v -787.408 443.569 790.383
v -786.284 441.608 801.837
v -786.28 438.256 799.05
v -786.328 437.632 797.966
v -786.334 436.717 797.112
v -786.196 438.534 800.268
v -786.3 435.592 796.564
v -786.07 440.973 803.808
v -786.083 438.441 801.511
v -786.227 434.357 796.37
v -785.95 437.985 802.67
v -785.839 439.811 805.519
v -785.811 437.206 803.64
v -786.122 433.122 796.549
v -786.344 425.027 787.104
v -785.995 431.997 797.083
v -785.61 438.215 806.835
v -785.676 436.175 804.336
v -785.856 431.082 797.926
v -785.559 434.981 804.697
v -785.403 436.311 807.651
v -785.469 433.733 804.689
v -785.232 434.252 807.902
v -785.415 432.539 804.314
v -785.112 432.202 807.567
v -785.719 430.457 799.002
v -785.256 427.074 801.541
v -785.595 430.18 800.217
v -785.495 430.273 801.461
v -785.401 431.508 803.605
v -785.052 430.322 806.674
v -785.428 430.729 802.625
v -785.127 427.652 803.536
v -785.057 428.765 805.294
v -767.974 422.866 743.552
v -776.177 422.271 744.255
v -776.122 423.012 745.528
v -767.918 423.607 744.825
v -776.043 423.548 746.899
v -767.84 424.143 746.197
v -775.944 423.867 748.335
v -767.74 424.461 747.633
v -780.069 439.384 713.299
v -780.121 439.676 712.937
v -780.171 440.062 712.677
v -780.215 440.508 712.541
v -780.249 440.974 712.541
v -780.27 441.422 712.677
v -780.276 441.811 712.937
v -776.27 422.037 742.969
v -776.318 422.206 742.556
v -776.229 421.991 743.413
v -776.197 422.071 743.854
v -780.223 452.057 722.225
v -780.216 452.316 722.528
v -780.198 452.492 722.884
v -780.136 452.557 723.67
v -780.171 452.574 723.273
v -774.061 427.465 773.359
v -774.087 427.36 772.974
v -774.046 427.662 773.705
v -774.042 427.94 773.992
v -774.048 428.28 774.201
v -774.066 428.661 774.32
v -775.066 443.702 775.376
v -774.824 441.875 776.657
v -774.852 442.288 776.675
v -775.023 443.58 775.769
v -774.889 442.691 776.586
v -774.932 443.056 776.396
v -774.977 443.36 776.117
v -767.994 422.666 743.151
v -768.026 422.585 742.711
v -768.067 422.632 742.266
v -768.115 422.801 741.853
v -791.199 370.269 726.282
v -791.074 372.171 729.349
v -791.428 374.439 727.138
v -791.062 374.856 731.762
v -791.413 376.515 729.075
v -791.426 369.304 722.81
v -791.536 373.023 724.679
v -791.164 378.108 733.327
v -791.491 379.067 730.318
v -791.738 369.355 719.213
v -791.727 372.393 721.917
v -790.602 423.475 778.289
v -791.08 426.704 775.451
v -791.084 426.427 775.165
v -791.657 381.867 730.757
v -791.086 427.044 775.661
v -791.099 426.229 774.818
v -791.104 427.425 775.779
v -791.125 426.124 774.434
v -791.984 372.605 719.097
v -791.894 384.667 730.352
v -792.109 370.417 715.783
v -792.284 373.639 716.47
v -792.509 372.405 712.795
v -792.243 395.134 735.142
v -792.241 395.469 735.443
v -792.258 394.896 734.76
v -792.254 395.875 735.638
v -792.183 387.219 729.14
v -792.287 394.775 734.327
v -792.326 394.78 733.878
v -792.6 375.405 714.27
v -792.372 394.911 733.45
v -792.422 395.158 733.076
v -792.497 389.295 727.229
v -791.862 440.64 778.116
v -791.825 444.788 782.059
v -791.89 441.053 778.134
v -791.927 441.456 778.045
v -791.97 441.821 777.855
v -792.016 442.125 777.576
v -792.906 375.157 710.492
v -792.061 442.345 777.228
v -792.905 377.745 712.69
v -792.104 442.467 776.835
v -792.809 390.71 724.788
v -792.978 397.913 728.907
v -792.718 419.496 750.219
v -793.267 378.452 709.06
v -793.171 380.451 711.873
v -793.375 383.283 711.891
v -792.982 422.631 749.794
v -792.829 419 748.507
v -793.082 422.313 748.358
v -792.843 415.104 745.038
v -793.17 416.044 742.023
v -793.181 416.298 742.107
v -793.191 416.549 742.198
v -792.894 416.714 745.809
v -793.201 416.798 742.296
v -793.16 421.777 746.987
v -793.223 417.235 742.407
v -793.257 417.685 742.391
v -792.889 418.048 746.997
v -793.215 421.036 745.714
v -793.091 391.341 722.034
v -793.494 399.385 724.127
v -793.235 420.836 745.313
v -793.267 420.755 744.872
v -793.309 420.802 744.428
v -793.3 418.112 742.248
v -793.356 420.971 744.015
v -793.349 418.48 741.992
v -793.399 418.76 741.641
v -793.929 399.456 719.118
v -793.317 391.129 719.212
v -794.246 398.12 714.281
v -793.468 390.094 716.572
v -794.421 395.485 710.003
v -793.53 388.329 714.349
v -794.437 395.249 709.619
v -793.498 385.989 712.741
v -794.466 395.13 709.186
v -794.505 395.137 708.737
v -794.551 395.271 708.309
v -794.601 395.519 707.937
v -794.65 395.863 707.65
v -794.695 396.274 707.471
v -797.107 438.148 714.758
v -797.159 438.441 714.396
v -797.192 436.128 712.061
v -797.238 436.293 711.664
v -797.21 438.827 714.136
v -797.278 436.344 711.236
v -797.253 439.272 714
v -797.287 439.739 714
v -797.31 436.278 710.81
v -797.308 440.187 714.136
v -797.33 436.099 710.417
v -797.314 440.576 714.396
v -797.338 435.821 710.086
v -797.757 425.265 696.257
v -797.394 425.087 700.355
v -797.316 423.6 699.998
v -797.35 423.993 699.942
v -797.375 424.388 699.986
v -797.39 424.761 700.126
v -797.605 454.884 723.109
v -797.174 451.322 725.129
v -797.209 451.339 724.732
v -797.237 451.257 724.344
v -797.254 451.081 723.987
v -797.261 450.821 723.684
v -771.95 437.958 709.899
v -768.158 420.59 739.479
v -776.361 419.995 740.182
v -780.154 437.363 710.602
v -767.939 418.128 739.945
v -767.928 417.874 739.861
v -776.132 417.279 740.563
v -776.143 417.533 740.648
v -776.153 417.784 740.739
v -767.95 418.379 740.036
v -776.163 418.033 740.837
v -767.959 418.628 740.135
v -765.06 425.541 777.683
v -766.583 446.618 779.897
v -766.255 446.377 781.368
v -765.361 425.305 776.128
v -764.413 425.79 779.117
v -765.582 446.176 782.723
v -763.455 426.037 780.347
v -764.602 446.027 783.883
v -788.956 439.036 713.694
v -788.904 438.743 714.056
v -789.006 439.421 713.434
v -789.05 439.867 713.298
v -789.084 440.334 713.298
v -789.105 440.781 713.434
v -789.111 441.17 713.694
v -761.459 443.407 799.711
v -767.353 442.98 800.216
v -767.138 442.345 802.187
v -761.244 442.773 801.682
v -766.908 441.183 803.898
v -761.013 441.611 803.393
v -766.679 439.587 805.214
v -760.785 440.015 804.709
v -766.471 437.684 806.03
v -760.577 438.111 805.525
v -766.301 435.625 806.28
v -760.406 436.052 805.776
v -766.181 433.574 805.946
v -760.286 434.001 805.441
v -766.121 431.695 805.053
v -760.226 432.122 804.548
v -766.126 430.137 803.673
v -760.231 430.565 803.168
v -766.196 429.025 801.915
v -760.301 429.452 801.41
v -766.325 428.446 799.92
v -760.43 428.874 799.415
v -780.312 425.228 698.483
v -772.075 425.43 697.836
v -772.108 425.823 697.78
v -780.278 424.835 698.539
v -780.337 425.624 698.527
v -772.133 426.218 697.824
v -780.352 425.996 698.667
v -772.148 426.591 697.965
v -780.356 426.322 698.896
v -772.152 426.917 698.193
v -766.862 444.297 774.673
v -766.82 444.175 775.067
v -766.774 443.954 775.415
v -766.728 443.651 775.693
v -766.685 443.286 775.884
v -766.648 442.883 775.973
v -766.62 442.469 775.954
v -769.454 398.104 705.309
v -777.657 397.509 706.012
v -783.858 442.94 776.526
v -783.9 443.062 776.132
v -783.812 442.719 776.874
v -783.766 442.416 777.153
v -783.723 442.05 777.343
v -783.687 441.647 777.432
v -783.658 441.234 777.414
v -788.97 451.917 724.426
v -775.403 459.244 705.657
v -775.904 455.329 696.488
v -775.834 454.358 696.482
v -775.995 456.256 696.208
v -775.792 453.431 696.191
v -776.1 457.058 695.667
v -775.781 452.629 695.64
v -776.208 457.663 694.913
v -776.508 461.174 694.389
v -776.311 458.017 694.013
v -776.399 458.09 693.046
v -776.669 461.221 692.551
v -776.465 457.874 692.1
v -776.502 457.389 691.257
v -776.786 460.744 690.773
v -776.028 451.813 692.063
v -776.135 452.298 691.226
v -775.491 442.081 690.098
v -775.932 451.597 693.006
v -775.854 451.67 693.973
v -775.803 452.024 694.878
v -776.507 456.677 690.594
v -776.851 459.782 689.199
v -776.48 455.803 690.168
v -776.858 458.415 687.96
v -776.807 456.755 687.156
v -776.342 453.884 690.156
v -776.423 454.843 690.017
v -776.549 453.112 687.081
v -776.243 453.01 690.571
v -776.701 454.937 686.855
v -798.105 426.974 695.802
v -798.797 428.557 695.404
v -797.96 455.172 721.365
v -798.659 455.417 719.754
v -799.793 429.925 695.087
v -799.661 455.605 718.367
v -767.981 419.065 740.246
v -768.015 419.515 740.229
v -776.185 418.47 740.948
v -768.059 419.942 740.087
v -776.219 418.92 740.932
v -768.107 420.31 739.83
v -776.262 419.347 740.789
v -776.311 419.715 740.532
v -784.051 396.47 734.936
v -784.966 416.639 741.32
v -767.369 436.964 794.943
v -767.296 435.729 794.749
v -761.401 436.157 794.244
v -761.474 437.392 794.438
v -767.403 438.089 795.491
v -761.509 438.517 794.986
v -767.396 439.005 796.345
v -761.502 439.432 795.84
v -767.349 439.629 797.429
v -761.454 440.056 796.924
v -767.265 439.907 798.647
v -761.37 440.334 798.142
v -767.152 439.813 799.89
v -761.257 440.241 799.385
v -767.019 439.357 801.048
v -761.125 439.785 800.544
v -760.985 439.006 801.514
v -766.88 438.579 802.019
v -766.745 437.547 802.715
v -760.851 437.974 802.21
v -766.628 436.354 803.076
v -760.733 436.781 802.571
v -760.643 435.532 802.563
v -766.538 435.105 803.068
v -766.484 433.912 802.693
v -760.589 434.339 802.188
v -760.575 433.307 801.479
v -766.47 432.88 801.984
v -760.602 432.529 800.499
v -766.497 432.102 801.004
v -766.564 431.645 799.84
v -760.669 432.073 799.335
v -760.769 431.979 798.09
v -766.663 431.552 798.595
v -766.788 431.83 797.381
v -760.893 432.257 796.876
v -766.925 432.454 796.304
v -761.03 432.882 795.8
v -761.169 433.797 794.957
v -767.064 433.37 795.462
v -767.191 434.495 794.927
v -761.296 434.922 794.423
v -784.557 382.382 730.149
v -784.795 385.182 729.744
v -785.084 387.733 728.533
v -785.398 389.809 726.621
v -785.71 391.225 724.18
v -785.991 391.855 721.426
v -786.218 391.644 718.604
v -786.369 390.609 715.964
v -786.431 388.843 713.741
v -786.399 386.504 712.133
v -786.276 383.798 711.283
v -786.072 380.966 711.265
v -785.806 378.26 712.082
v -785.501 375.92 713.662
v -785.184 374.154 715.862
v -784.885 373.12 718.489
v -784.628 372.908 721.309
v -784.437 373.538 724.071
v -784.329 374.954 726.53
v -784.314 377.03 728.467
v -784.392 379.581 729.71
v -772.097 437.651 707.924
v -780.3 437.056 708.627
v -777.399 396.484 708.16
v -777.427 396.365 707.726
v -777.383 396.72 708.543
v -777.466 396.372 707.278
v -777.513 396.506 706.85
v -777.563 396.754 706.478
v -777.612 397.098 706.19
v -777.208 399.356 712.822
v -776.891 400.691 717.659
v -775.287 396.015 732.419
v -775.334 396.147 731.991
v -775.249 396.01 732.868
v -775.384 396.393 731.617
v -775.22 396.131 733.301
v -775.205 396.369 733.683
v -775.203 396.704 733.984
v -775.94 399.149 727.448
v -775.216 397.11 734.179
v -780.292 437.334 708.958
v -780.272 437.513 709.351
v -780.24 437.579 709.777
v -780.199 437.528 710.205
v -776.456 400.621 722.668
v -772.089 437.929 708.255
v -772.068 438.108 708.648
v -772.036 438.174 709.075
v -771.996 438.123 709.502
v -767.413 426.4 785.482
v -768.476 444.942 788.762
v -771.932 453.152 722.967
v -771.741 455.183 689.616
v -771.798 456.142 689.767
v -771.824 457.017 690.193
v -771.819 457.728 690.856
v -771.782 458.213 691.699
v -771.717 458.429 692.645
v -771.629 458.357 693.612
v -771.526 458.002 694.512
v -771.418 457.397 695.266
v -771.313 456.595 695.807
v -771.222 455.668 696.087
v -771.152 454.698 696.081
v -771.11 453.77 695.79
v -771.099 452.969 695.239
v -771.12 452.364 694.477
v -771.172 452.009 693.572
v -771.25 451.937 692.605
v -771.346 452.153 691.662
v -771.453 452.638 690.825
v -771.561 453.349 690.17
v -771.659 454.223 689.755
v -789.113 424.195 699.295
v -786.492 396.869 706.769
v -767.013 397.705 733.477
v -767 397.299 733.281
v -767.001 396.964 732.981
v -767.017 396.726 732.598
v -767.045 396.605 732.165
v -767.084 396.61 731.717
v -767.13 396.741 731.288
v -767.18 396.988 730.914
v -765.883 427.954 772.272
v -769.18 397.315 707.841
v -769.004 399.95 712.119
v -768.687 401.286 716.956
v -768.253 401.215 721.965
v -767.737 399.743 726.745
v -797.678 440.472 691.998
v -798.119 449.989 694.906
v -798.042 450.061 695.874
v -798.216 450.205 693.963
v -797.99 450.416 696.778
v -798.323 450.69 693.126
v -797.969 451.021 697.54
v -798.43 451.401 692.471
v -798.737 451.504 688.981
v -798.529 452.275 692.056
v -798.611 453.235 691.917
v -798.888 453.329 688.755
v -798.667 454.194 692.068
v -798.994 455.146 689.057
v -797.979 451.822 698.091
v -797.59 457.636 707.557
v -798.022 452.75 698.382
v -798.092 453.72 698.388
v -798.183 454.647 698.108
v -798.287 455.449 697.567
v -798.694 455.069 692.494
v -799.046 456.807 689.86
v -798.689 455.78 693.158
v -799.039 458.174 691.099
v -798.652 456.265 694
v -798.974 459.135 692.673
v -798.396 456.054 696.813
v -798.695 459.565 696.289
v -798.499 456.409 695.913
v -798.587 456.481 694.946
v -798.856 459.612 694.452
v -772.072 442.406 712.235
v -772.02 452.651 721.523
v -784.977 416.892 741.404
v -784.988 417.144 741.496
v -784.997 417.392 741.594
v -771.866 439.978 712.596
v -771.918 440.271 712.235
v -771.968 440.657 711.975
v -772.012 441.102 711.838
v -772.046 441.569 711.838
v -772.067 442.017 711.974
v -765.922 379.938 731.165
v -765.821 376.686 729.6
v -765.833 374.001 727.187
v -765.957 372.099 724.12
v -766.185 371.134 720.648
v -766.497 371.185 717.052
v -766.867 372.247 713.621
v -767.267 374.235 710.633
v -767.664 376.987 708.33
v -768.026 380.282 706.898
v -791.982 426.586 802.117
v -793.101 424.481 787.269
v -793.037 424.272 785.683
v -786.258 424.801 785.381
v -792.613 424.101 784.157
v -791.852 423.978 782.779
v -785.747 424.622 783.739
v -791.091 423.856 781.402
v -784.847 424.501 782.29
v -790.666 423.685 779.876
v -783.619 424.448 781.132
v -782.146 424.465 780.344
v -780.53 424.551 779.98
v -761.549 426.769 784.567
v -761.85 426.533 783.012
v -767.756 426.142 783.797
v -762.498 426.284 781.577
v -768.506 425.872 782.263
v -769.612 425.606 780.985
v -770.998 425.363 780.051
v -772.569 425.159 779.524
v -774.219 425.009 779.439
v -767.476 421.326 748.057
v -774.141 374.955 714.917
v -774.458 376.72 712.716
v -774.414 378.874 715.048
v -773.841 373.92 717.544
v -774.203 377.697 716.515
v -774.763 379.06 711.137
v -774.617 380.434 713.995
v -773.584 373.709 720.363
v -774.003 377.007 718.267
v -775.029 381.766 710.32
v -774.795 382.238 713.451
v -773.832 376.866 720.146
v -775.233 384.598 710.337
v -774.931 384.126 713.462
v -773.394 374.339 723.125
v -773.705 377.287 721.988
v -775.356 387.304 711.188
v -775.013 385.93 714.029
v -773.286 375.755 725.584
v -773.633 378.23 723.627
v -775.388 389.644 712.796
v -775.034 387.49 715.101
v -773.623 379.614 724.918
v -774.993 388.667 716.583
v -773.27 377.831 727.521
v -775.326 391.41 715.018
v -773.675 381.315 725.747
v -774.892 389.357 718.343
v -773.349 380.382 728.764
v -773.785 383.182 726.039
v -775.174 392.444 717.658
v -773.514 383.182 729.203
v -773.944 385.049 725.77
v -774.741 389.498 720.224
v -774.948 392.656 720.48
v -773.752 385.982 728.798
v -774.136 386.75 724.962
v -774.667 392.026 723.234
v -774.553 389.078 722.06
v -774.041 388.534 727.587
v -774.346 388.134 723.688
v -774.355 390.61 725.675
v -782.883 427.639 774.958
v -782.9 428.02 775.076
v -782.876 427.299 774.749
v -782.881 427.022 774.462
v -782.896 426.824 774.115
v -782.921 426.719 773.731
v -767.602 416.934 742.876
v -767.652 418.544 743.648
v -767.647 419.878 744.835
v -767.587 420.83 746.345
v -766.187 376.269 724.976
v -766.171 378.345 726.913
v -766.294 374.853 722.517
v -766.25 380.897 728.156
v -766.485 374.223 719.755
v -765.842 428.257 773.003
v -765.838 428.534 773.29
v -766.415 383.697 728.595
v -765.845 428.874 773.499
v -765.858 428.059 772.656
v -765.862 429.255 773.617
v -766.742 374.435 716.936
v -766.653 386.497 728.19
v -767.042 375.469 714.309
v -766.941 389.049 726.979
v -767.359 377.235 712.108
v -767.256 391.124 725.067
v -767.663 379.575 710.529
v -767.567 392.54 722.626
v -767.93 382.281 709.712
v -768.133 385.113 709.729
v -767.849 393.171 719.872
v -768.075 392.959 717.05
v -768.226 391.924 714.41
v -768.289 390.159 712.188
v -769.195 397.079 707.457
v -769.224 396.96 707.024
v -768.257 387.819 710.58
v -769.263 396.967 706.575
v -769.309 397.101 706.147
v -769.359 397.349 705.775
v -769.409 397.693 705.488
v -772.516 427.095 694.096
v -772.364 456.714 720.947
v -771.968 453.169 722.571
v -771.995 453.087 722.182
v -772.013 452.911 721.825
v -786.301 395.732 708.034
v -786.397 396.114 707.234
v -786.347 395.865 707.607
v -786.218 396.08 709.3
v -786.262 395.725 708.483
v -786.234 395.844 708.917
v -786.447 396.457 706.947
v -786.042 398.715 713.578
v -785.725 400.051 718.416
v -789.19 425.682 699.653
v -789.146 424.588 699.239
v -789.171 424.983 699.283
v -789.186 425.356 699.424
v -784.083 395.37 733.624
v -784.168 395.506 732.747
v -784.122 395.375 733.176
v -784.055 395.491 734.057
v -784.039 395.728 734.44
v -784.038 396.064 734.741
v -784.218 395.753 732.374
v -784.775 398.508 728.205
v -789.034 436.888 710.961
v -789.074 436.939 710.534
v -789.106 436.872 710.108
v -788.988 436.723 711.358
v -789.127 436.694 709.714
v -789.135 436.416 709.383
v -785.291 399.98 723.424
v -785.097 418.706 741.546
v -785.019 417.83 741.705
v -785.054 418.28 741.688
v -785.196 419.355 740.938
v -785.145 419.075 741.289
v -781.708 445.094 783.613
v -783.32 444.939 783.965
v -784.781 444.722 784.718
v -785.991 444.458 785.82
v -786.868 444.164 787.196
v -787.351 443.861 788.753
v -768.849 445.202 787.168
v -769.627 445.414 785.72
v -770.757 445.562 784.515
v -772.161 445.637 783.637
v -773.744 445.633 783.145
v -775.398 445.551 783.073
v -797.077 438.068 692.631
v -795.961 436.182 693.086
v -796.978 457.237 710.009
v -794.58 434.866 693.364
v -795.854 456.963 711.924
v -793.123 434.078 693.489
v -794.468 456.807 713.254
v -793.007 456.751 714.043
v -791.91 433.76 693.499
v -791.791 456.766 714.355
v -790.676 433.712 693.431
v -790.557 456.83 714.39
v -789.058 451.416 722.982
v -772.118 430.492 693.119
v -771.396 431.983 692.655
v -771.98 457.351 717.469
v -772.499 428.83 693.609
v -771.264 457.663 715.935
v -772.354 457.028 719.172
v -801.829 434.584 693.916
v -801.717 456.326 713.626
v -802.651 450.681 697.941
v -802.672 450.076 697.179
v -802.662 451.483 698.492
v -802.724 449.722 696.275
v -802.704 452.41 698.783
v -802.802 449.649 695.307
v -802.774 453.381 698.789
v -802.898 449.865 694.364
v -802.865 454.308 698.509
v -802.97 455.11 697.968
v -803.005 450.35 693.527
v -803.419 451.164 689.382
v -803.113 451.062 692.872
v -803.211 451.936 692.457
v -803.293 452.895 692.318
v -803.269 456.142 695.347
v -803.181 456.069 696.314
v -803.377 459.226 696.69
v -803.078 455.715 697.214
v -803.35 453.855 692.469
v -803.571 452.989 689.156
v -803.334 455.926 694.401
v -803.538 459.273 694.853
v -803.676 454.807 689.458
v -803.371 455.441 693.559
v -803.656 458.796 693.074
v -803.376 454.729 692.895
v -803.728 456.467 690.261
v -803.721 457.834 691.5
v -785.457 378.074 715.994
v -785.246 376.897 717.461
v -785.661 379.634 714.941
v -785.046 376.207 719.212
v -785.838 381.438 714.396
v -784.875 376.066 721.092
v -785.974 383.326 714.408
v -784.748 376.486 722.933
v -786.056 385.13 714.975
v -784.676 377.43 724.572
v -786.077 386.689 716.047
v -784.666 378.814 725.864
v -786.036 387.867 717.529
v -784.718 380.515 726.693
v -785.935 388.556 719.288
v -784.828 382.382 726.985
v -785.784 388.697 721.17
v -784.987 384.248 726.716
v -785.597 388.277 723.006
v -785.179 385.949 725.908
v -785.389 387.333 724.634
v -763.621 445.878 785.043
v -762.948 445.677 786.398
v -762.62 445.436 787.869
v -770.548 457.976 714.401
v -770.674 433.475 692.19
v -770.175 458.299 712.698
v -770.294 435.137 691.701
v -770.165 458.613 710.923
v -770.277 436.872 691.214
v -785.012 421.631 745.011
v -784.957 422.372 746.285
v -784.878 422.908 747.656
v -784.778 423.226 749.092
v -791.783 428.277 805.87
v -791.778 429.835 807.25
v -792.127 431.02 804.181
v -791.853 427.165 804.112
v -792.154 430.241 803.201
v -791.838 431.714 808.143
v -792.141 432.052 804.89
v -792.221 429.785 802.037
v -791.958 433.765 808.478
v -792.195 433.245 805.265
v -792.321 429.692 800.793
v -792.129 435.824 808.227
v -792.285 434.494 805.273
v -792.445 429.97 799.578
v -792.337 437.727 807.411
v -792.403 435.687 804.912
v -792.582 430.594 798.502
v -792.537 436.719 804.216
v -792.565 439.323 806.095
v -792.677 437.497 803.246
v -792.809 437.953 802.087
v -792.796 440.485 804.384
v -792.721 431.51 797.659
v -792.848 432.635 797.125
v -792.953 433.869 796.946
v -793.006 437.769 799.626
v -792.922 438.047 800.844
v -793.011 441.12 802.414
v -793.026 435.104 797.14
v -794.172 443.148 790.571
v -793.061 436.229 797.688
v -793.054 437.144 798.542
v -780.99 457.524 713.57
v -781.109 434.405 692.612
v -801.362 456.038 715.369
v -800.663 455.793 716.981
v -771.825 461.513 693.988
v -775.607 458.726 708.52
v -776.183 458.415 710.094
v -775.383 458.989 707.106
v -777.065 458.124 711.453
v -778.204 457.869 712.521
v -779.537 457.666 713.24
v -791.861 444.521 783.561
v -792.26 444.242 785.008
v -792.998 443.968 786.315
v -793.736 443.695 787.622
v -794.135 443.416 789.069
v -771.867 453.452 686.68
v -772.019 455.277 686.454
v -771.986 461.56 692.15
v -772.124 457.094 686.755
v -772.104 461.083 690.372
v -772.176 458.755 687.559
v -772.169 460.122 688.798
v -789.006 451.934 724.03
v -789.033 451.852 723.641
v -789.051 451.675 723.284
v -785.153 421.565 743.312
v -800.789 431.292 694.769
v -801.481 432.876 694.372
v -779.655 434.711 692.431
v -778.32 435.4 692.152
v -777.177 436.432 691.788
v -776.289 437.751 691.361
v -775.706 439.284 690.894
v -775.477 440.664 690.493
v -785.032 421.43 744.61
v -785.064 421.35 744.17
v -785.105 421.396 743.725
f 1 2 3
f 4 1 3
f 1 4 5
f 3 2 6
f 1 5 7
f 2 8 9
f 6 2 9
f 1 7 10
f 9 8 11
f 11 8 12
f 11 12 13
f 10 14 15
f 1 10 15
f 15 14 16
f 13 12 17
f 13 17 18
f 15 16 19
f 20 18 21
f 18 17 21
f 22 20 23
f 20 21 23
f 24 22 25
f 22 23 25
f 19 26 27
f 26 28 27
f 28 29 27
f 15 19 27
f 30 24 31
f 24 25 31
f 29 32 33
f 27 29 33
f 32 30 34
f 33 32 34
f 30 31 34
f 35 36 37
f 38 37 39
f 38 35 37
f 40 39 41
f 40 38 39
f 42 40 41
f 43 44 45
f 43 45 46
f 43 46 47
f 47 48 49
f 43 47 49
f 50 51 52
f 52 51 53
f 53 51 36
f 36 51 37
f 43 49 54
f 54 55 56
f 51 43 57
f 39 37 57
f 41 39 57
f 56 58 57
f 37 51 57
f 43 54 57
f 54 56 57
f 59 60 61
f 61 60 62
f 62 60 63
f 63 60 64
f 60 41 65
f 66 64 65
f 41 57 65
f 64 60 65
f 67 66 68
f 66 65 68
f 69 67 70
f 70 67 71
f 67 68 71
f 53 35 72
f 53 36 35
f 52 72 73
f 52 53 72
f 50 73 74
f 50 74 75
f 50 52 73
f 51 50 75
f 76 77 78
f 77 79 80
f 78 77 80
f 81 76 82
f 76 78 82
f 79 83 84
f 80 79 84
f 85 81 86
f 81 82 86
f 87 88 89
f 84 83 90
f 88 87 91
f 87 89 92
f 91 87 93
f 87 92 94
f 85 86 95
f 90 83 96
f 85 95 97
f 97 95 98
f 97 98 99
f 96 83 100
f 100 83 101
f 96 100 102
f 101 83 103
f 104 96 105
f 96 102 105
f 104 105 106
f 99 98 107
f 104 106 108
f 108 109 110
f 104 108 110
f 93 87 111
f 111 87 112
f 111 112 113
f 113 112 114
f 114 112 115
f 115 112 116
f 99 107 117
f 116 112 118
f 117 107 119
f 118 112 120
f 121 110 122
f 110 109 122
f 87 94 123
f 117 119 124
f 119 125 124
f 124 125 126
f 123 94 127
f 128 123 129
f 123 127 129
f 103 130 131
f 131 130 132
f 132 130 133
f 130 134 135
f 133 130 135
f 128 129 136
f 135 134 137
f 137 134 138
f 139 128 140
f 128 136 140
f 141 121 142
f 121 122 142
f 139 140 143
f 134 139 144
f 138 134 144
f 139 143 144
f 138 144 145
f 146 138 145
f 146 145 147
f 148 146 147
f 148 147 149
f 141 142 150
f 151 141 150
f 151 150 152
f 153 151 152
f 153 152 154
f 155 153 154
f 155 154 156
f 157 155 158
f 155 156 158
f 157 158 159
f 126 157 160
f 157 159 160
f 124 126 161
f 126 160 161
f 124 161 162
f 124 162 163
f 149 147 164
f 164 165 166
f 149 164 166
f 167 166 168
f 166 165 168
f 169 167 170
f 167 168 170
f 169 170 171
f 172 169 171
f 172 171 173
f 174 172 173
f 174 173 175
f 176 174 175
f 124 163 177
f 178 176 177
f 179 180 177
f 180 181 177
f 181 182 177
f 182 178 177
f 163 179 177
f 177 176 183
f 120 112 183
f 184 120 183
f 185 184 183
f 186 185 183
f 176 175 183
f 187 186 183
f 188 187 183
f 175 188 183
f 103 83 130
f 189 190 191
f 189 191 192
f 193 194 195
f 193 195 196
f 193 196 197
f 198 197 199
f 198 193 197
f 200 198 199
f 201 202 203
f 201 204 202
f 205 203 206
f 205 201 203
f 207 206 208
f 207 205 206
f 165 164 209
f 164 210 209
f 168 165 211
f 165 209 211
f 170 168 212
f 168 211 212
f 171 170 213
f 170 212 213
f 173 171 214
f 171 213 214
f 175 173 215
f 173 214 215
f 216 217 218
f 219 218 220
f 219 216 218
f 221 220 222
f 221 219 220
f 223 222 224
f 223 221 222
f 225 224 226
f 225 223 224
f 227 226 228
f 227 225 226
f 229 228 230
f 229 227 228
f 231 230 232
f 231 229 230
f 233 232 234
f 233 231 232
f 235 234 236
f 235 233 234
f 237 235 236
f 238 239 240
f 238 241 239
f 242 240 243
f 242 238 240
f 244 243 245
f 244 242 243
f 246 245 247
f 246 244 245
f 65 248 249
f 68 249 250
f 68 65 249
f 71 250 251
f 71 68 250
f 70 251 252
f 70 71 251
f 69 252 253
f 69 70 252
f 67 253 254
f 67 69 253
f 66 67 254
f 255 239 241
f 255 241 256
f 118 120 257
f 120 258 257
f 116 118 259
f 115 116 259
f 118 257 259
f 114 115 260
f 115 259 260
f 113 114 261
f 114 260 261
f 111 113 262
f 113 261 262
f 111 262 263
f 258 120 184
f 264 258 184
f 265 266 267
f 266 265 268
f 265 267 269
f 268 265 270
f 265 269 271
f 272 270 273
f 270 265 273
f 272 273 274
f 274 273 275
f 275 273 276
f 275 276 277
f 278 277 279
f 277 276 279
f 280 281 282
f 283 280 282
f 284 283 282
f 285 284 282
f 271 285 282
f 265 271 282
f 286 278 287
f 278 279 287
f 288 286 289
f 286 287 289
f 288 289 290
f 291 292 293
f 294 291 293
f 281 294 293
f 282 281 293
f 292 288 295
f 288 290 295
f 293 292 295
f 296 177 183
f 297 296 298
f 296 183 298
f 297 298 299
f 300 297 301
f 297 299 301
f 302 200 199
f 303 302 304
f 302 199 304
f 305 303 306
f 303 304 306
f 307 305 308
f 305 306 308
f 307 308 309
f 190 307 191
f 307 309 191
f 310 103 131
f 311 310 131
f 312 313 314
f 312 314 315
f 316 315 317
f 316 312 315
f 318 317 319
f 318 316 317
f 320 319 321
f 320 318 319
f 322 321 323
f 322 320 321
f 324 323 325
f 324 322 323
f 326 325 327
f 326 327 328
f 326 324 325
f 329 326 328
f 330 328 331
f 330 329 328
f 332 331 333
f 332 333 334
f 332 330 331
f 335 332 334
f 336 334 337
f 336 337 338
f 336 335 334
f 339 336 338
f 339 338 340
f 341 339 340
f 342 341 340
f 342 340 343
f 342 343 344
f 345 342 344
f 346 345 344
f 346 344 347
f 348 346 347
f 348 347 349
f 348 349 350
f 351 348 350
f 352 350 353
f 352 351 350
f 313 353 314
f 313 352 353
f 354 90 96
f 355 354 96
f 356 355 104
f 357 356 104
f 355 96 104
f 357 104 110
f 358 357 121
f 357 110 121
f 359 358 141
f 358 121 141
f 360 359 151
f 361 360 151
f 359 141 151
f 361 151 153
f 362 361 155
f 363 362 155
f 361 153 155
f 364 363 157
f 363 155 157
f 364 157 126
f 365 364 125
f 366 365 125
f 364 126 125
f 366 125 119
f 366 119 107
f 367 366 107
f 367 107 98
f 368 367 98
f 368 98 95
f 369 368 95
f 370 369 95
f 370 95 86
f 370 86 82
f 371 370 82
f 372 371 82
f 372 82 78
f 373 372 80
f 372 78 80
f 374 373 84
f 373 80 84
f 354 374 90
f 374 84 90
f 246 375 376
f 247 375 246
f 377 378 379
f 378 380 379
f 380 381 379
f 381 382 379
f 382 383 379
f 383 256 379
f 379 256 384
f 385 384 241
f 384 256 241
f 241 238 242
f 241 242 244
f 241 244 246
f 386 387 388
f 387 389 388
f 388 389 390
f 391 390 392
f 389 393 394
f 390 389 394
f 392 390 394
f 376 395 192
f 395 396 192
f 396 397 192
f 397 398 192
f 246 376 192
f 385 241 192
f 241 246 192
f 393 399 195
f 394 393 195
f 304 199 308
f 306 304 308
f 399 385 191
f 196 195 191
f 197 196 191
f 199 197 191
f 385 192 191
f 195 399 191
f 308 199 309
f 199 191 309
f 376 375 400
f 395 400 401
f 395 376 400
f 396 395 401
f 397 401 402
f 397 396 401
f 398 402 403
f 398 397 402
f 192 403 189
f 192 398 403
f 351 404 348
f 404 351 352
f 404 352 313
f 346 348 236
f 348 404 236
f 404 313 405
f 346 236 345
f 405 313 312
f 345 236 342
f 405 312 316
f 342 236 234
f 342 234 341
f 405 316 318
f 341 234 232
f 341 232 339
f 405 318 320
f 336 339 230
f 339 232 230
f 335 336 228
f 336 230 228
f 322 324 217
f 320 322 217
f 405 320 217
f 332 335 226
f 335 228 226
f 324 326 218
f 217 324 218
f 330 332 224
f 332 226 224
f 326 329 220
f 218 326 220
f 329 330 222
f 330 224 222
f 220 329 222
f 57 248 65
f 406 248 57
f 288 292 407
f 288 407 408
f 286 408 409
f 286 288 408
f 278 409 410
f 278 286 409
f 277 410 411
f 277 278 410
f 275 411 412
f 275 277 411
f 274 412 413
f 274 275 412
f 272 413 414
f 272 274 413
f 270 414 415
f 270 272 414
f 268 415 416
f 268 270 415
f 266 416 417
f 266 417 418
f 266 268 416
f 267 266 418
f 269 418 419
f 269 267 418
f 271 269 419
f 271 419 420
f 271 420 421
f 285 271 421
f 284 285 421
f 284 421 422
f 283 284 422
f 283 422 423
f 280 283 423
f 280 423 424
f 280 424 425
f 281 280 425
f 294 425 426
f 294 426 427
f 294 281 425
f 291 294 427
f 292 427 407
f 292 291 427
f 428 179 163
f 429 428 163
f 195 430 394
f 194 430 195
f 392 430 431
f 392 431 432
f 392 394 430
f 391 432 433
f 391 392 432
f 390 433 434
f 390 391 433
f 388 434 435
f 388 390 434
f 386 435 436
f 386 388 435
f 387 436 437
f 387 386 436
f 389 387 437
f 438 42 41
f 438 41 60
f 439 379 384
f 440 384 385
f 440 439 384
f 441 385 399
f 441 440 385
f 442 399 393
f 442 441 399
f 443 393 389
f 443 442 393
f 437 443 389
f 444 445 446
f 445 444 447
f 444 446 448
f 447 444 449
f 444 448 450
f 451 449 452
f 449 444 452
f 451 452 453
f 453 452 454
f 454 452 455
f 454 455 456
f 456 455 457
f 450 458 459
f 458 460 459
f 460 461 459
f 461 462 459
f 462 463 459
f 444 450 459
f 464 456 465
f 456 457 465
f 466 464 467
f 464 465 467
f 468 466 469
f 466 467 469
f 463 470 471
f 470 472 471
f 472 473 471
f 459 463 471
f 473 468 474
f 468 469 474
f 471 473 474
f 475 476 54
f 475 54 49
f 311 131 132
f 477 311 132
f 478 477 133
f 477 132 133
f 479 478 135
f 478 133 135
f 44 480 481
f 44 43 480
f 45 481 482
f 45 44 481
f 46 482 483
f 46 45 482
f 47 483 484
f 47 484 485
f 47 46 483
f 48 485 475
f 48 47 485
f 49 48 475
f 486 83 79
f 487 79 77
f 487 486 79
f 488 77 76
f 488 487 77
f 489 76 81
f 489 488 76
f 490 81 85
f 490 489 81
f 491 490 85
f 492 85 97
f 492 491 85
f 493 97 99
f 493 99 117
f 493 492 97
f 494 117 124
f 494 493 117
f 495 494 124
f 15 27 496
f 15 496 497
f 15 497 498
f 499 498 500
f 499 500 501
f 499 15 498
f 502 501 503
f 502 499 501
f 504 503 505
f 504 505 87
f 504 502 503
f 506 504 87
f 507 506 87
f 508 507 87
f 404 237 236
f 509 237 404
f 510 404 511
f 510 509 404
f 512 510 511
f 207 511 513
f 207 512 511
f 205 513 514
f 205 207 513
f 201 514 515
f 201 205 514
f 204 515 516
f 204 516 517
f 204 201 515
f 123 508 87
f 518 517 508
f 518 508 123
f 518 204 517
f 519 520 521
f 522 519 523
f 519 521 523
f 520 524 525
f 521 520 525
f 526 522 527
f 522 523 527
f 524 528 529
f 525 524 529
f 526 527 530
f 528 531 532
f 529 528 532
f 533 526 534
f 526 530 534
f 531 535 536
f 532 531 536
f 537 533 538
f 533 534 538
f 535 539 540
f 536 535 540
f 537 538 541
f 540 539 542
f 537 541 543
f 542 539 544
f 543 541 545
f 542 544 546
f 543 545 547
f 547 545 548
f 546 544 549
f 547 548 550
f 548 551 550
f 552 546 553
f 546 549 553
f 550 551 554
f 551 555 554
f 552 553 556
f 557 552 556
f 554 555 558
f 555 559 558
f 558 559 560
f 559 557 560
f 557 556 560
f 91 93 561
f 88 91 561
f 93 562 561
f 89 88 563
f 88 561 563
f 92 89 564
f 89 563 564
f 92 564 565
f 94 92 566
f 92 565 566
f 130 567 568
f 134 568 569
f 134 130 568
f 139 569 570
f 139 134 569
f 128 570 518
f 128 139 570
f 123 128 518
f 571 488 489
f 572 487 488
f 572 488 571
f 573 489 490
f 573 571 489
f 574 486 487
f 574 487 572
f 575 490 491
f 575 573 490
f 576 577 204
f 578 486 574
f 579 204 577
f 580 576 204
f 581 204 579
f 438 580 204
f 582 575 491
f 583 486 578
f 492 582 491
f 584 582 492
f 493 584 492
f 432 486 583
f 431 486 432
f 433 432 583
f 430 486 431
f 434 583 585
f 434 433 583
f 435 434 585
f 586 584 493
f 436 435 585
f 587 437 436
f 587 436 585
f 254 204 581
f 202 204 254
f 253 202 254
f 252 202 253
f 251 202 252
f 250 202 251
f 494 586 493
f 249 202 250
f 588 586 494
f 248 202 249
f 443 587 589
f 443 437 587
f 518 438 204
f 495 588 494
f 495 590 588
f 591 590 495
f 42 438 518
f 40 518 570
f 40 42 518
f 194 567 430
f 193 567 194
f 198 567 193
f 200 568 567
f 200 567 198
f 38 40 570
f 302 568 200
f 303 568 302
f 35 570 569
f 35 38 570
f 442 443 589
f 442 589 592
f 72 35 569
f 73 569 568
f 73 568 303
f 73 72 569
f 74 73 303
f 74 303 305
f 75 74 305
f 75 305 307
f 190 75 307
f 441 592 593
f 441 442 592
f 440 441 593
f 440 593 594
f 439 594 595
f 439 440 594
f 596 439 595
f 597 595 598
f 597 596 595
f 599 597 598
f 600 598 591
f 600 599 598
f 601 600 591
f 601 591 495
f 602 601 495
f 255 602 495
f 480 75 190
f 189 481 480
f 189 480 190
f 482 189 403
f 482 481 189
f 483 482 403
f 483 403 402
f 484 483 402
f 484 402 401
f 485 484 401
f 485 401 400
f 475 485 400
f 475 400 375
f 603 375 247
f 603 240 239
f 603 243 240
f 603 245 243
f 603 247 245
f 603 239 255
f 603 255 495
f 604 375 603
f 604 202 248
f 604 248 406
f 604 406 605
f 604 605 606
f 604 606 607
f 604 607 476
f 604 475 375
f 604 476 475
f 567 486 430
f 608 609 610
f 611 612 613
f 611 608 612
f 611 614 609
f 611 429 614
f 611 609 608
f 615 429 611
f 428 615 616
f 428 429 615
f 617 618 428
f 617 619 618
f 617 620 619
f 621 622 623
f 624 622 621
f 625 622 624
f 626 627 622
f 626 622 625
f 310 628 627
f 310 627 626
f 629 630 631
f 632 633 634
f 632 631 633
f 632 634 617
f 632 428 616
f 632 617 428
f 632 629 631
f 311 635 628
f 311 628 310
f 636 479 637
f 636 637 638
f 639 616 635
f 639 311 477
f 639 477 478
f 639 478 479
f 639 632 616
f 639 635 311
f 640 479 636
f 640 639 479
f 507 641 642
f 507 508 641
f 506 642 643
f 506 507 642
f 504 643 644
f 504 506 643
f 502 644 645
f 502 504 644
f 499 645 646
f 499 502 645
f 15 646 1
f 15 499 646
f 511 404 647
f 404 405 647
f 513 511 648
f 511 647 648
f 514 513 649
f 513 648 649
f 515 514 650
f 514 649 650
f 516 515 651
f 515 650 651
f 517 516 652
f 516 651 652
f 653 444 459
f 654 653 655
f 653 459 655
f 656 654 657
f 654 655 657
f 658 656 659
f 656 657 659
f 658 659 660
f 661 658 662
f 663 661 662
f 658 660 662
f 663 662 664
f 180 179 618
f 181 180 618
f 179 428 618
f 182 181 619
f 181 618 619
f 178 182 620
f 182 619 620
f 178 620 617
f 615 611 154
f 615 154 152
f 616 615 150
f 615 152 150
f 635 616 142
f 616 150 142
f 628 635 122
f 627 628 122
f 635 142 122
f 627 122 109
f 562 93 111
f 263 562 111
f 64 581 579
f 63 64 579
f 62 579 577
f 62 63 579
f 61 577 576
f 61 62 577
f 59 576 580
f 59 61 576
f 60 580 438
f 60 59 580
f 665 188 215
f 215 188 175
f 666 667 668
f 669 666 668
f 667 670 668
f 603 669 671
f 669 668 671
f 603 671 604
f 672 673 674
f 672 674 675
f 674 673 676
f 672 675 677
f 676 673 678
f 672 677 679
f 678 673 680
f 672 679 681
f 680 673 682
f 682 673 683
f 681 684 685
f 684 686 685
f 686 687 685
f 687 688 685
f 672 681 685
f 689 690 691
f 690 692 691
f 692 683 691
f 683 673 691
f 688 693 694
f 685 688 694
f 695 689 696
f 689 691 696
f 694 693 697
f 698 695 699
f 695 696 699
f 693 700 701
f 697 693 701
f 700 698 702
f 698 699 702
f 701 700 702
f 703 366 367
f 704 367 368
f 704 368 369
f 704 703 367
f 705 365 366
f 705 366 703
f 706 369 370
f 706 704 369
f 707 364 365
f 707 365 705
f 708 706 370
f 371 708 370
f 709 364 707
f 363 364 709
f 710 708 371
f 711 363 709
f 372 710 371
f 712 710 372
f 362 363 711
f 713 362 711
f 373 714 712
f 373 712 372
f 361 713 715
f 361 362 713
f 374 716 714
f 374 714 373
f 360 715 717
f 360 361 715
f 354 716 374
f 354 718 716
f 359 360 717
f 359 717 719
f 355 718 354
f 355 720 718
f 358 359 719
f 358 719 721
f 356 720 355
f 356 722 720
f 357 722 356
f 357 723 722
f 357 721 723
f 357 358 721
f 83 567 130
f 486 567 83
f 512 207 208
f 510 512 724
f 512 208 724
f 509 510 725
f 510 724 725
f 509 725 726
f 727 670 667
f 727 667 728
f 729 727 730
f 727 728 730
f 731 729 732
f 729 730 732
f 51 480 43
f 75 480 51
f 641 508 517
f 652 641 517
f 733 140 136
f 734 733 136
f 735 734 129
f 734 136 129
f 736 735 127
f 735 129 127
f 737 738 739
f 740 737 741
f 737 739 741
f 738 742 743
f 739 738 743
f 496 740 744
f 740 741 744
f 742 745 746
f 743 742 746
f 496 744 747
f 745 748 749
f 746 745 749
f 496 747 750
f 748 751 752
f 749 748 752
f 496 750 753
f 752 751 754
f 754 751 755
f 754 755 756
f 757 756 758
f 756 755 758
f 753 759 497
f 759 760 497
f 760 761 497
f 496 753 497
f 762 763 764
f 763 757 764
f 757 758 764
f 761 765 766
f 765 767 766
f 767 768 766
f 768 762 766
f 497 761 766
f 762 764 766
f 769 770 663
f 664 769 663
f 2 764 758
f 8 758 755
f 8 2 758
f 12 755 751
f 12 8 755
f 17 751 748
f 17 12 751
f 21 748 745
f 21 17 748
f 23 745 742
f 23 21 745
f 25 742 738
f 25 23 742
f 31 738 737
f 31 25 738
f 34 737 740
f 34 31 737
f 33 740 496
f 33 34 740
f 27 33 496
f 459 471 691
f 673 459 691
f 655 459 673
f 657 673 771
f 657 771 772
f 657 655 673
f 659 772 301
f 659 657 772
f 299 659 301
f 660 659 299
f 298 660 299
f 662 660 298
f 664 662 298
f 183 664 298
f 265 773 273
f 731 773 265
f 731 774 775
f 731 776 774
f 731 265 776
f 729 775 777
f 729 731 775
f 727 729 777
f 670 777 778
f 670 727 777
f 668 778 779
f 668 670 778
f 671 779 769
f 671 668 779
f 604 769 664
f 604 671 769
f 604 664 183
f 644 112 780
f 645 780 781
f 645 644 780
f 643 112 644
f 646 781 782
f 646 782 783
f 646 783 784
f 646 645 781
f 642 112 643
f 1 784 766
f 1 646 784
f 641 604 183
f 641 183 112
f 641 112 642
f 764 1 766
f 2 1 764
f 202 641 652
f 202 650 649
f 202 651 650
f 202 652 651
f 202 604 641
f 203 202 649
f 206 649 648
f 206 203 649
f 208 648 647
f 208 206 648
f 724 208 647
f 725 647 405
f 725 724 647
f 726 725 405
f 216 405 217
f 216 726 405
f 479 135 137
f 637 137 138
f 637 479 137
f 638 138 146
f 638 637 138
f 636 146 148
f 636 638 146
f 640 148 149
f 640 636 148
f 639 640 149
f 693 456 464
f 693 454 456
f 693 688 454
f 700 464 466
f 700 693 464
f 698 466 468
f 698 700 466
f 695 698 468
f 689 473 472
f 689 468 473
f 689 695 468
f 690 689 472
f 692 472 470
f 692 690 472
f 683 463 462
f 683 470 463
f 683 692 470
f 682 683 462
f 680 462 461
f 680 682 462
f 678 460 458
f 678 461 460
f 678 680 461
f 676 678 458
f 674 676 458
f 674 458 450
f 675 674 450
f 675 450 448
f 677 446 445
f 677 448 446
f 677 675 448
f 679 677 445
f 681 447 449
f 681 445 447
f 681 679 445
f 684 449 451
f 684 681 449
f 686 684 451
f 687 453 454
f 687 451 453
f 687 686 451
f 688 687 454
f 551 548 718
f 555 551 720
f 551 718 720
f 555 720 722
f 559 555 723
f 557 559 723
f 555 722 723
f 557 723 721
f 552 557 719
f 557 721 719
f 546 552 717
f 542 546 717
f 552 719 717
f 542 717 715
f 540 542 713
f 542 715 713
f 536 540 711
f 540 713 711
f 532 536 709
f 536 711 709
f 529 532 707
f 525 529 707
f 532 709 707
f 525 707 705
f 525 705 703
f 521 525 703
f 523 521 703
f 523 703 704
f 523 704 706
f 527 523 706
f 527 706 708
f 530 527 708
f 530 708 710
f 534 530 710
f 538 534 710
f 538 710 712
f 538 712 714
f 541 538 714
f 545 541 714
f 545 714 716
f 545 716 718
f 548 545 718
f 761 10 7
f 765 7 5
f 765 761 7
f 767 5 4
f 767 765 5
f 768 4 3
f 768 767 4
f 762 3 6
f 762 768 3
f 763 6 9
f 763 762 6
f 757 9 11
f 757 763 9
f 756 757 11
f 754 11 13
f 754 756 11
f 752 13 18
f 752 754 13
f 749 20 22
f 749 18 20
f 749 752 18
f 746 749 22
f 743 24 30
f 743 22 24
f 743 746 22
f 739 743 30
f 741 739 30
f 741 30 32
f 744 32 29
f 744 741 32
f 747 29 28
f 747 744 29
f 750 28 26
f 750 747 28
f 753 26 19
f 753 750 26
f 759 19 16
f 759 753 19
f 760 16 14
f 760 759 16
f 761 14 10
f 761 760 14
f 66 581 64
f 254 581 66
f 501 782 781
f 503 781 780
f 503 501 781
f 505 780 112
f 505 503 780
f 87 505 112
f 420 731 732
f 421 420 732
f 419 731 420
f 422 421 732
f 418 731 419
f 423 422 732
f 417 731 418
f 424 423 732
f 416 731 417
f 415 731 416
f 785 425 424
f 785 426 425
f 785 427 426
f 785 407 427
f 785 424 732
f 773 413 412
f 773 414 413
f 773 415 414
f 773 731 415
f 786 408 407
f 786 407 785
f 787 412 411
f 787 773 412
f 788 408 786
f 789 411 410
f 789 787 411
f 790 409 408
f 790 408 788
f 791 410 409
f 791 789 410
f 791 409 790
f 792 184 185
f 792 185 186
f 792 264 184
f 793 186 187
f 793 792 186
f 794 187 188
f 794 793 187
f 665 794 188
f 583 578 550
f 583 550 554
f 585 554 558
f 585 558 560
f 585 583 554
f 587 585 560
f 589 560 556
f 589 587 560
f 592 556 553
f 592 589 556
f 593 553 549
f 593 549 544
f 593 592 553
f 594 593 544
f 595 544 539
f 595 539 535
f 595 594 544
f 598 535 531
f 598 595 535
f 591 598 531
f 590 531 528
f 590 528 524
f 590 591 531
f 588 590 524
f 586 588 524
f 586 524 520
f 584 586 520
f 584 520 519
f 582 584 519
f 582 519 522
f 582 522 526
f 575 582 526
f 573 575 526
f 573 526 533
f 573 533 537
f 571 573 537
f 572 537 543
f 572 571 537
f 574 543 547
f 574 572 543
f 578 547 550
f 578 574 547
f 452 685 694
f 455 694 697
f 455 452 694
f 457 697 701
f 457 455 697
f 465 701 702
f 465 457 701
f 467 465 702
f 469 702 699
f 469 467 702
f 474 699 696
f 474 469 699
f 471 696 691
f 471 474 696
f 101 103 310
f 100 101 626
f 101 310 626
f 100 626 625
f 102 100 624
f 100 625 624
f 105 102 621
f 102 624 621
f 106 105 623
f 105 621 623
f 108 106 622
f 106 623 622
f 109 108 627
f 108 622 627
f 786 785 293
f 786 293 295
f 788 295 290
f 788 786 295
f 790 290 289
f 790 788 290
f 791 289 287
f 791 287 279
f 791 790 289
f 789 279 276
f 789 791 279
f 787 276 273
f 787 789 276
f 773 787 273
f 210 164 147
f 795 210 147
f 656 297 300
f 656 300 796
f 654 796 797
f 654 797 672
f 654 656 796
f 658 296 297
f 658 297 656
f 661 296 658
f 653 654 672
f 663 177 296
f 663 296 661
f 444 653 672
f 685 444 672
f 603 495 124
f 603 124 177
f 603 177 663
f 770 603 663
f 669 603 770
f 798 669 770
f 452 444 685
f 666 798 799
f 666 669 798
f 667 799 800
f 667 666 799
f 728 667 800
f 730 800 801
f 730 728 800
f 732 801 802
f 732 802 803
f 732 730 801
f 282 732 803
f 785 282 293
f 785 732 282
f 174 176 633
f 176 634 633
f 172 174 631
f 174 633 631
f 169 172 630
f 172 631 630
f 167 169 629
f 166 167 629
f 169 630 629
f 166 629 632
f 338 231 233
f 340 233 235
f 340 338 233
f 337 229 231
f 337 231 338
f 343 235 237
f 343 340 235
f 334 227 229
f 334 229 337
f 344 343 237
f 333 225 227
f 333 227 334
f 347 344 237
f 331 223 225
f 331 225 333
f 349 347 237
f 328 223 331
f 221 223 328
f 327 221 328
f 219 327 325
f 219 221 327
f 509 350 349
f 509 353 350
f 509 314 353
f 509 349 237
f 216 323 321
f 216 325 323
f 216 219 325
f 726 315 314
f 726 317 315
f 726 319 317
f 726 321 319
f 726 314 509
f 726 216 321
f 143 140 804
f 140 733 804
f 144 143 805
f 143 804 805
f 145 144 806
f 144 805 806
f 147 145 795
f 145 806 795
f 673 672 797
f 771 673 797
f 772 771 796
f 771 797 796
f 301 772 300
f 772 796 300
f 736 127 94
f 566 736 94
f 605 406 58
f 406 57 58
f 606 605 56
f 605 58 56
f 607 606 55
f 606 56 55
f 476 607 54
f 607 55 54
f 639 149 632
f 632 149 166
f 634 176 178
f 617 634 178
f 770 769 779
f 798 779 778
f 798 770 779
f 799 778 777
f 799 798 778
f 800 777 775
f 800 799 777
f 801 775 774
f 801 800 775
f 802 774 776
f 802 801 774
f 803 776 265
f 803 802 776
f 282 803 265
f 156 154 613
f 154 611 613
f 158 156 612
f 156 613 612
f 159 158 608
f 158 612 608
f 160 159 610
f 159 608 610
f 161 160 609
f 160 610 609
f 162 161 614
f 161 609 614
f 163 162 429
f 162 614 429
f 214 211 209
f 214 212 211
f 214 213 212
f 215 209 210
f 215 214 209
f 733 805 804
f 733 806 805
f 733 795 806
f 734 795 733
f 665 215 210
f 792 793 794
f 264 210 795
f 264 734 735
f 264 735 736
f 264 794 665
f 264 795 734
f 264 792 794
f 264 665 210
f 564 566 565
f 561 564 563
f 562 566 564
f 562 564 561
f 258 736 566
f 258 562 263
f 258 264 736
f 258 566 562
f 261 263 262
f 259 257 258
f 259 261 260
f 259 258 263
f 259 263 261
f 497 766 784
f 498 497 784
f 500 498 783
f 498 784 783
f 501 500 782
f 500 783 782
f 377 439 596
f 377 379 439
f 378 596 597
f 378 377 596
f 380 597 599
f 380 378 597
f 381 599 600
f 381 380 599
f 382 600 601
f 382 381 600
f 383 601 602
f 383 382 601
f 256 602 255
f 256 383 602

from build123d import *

# Parameters (mm, degrees)
SKETCH1_R                      = 3.263900000000121
SKETCH1_R_2                    = 4.199999999999976
BOSS_EXTRUDE1_DEPTH            = 15.875
FILLET7_R                      = 6.35
CUT_EXTRUDE6_DEPTH             = 25.4
FILLET8_R                      = 6.35
CUT_EXTRUDE8_REACH             = 1218.683
CUT_EXTRUDE8_END_RADIUS        = 6.438900000000022
CUT_EXTRUDE8_DIRECTION_2_DEPTH = 16.054722017999996
FILLET9_R                      = 6.35
CUT_EXTRUDE9_DEPTH             = 3.175
FILLET14_R                     = 6.35
FILLET15_R                     = 6.35
FILLET16_R                     = 6.35
FILLET17_R                     = 6.35
SKETCH29_R                     = 9.525000000000018
CUT_EXTRUDE10_DEPTH            = 7.14375
SKETCH30_R                     = 6.349999999999941
CUT_EXTRUDE11_DEPTH            = 906.2428652120986
FILLET18_R                     = 6.35
FILLET19_R                     = 6.35
FILLET20_R                     = 6.35
FILLET21_R                     = 6.35
CUT_EXTRUDE12_DEPTH            = 8.255
FILLET22_R                     = 1.5875


with BuildPart() as part:
    # Sketch1 → Boss-Extrude1 (new, symmetric)
    with BuildSketch(Plane(origin=(-803.6566332789141, -58.26345281012812, 68.82567852426239), x_dir=(-0.08515417095162939, -0.00241614660156225, -0.9963648575723355), z_dir=(0.9937636896807375, 0.07204582335356381, -0.08510657089457987))):
        with BuildLine():
            ThreePointArc((-664.2038450226969, 436.8184776127322), (-651.8745198787159, 427.9178662715624), (-639.8468613838354, 437.2220896073974))
            Line((-639.8468613838348, 437.2220896073972), (-619.5515204929051, 510.40226291213133))
            ThreePointArc((-619.5515204929051, 510.40226291213133), (-620.9838530756886, 516.4455246988489), (-626.8562553144544, 518.4672768094307))
            Line((-626.8562553144544, 518.4672768094307), (-733.0342996841451, 500.0570320892499))
            ThreePointArc((-733.0342996841451, 500.05703208924996), (-739.1483230926673, 492.6676503574812), (-732.7916358037484, 485.48595339028384))
            Line((-732.7916358037484, 485.4859533902838), (-677.0205822251494, 477.71877799538424))
            Line((-677.0205822251494, 477.71877799538424), (-664.2038450226976, 436.81847761273195))
        make_face()
        with Locations(Location((-625.7562257117465, 512.1230378414245, 0), (0, 0, 0.138795824))):
            Circle(SKETCH1_R, mode=Mode.SUBTRACT)
        with Locations(Location((-731.7743456050367, 492.79045512904787, 0), (0, 0, 0.138795824))):
            Circle(SKETCH1_R_2, mode=Mode.SUBTRACT)
    extrude(amount=BOSS_EXTRUDE1_DEPTH, both=True)

    # Fillet7
    fillet7_edges = [part.edges().sort_by_distance(p)[0] for p in [
        (-780.3962698306742, 419.8482713749311, 745.1689599242694),
    ]]
    fillet(fillet7_edges, radius=FILLET7_R)

    # Sketch23 → Cut-Extrude6 (cut)
    with BuildSketch(Plane(origin=(61.972947811989165, -108.23638463445343, 632.0133130126799), x_dir=(0.9953619214294605, 0.016238085990304504, -0.09482072522199067), z_dir=(0.09620106739496219, -0.1680161441472004, 0.9810789621319872))):
        Polygon((-851.4974580179244, 570.6197226277428), (-849.4828619685262, 535.112578894877), (-830.4634507696352, 536.1916978167321), (-832.4780468190336, 571.698841549598), align=None)
    extrude(amount=-CUT_EXTRUDE6_DEPTH, mode=Mode.SUBTRACT)

    # Fillet8
    fillet8_edges = [part.edges().sort_by_distance(p)[0] for p in [
        (-768.4981336258412, 435.73746338308155, 780.7155057686616),
        (-787.4293319142591, 434.3649904481961, 782.3367859442033),
    ]]
    fillet(fillet8_edges, radius=FILLET8_R)

    # Cut-Extrude8: up to this cylinder (the profile starts inside it)
    cut_extrude8_end = Plane(origin=(-787.2383908251443, 454.03916279522144, 694.2194195095605), z_dir=(-0.9937636896807374, -0.0720458233535638, 0.08510657089457985)) * Cylinder(CUT_EXTRUDE8_END_RADIUS, 2451.2438, mode=Mode.PRIVATE)
    # Sketch26 → Cut-Extrude8 (cut, up to the surface)
    with BuildSketch(Plane(origin=(12.989728013299839, -77.83595490095189, 85.78614441110385), x_dir=(-0.993770984048656, -0.07487836809153875, 0.0825376353848), z_dir=(-0.11144160447231, 0.6677710026657366, -0.7359773480151642)), mode=Mode.PRIVATE) as cut_extrude8_sk1:
        Polygon((794.3756771448955, 828.136387084358), (794.5699361916237, 777.3363870843579), (816.8963729530036, 777.4217633111716), (816.7021139062754, 828.2217633111715), align=None)
    cut_extrude8_tool1 = extrude(cut_extrude8_sk1.sketch, amount=CUT_EXTRUDE8_REACH, mode=Mode.PRIVATE) & cut_extrude8_end
    add(cut_extrude8_tool1.solids().sort_by_distance((-787.621991, 456.37034, 691.713663))[0], mode=Mode.SUBTRACT)

    # Sketch26 → Cut-Extrude8 direction 2 (cut)
    with BuildSketch(Plane(origin=(12.989728013299839, -77.83595490095189, 85.78614441110385), x_dir=(-0.993770984048656, -0.07487836809153875, 0.0825376353848), z_dir=(-0.11144160447231, 0.6677710026657366, -0.7359773480151642))):
        Polygon((794.3756771448955, 828.136387084358), (794.5699361916237, 777.3363870843579), (816.8963729530036, 777.4217633111716), (816.7021139062754, 828.2217633111715), align=None)
    extrude(amount=-CUT_EXTRUDE8_DIRECTION_2_DEPTH, mode=Mode.SUBTRACT)

    # Fillet9
    fillet9_edges = [part.edges().sort_by_distance(p)[0] for p in [
        (-796.9266720049268, 444.8135668092432, 704.4509735768399),
        (-774.7393076109009, 446.4221050889288, 702.550833211105),
    ]]
    fillet(fillet9_edges, radius=FILLET9_R)

    # Sketch28 → Cut-Extrude9 (cut)
    with BuildSketch(Plane(origin=(-819.4326318525958, -59.407180255866336, 70.17674533721404), x_dir=(0.08496772843683141, 0.004995311208659764, 0.9963711818344676), z_dir=(-0.9937636896807374, -0.07204582335356427, 0.0851065708945801))):
        with BuildLine():
            Line((627.1625420198034, 485.8765159269481), (651.6049859690769, 512.7230828073026))
            Line((651.6049859690769, 512.7230828073026), (717.0206192545211, 501.2063227964691))
            Line((717.0206192545211, 501.2063227964691), (713.4230156056034, 480.7717977405854))
            Line((713.4230156056034, 480.7717977405854), (682.2365581379875, 476.51067285676993))
            ThreePointArc((682.2365581379875, 476.51067285676993), (679.0046113636374, 475.0752012300429), (677.0416730946137, 472.1336145671395))
            Line((677.0416730946137, 472.1336145671395), (665.3311932697678, 435.0994522969059))
            ThreePointArc((665.3311932697678, 435.0994522969059), (652.9788932558142, 426.23075311845423), (640.9753347674774, 435.5660476702974))
            Line((640.9753347674774, 435.5660476702974), (627.1625420198034, 485.8765159269481))
        make_face()
    cut_extrude9 = extrude(amount=-CUT_EXTRUDE9_DEPTH, mode=Mode.SUBTRACT)

    # Mirror4: Cut-Extrude9 across plane
    add(cut_extrude9.mirror(Plane(origin=(-803.6566332789141, -58.26345281012812, 68.82567852426239), x_dir=(0.08488379068765235, 0.00615390022091489, 0.9963718540738523), z_dir=(0.9937636896807375, 0.07204582335356381, -0.08510657089457987))), mode=Mode.SUBTRACT)

    # Fillet14
    # the kernel refuses this fillet: 6.35 mm, written as the material it takes off along each edge
    with BuildSketch(Plane(origin=(-763.9240545414428, 459.87606491191445, 784.86418850568), x_dir=(-0.9937636896807339, -0.07204582335356931, 0.08510657089461458), z_dir=(0.05638336371836082, -0.9831479922388159, -0.17389922844161387))) as fillet14_piece_1:
        with BuildLine():
            CenterArc((6.350000000000176, -5.499261314031187), FILLET14_R, 120.00000000000045, 60.00000000000114)
            Line((1.7393e-13, -5.499261314031369), (-0.12699999999987513, -5.499261314031325))
            Line((-0.12699999999987513, -5.499261314031325), (-0.12700000000006137, 7.226e-14))
            Line((-0.12700000000006137, 7.226e-14), (3.717e-14, 0.12700000000007206))
            ThreePointArc((3.717e-14, 0.12700000000007206), (1.5875000000000965, 0.12700000000011827), (3.1115000000000648, 0.10998522628065008))
            Line((3.1115000000000648, 0.10998522628065008), (3.17500000000012, -2e-17))
        make_face()
    extrude(amount=48.245103312962, mode=Mode.SUBTRACT)

    # Fillet15
    fillet15_edges = [part.edges().sort_by_distance(p)[0] for p in [
        (-765.7191436523169, 435.93128119402047, 780.9395087471651),
    ]]
    fillet(fillet15_edges, radius=FILLET15_R)

    # Fillet16
    # the kernel refuses this fillet: 6.35 mm, written as the material it takes off along each edge
    with BuildSketch(Plane(origin=(-795.4760516888064, 457.58861002043943, 787.566322131583), x_dir=(0.09620106739496583, -0.1680161441471998, 0.9810789621319869), z_dir=(0.056383363718361654, -0.9831479922388158, -0.17389922844161396))) as fillet16_piece_1:
        with BuildLine():
            CenterArc((5.499261314031349, -6.350000000000004), FILLET16_R, 89.99999999999983, 59.99999999999977)
            Line((2.1372e-13, -3.174999999999983), (-0.10998522628039077, -3.1114999999999853))
            ThreePointArc((-0.10998522628039077, -3.1114999999999853), (-0.1270000000000597, -1.587499999999776), (-0.1270000000000243, 6.167e-14))
            Line((-0.1270000000000243, 6.167e-14), (7.628e-14, 0.12700000000006137))
            Line((7.628e-14, 0.12700000000006137), (5.4992613140314255, 0.12700000000005307))
            Line((5.4992613140314255, 0.12700000000005307), (5.499261314031368, -8e-17))
        make_face()
    extrude(amount=48.24510331296339, mode=Mode.SUBTRACT)

    # Fillet17
    fillet17_edges = [part.edges().sort_by_distance(p)[0] for p in [
        (-790.9607413702078, 434.1013172808399, 783.1012156478874),
    ]]
    fillet(fillet17_edges, radius=FILLET17_R)

    # Sketch29 → Cut-Extrude10 (cut)
    with BuildSketch(Plane(origin=(-816.2774321378596, -59.17843476671879, 69.90653197462376), x_dir=(0.08496772843683141, 0.004995311208659761, 0.9963711818344676), z_dir=(-0.9937636896807374, -0.07204582335356424, 0.0851065708945801))):
        with Locations(Location((653.2221478363805, 438.92842326730624, 0), (0, 0, 359.713042845))):
            Circle(SKETCH29_R)
    cut_extrude10 = extrude(amount=-CUT_EXTRUDE10_DEPTH, mode=Mode.SUBTRACT)

    # Mirror6: Cut-Extrude10 across plane
    add(cut_extrude10.mirror(Plane(origin=(-803.6566332789141, -58.26345281012812, 68.82567852426239), x_dir=(0.08488379068765235, 0.00615390022091489, 0.9963718540738523), z_dir=(0.9937636896807375, 0.07204582335356381, -0.08510657089457987))), mode=Mode.SUBTRACT)

    # Sketch30 → Cut-Extrude11 (cut, through all)
    with BuildSketch(Plane(origin=(-809.1782327797032, -58.663757416136754, 69.29855190879563), x_dir=(0.08496772843683141, 0.004995311208659758, 0.9963711818344676), z_dir=(-0.9937636896807374, -0.07204582335356423, 0.0851065708945801))):
        with Locations(Location((653.2221478363805, 438.9284232673062, 0), (0, 0, 359.713042845))):
            Circle(SKETCH30_R)
    extrude(amount=-CUT_EXTRUDE11_DEPTH, mode=Mode.SUBTRACT)

    # Fillet18
    # the kernel refuses this fillet: 6.35 mm, written as the material it takes off along each edge
    with BuildSketch(Plane(origin=(-801.2813108853807, 418.14787225507484, 686.3920398850967), x_dir=(0.9937636896807204, 0.07204582335366592, -0.08510657089469212), z_dir=(0.00380760617239137, 0.7408719776966206, 0.6716354776209593))) as fillet18_piece_1:
        with BuildLine():
            CenterArc((6.35000000000041, 5.499261314030801), FILLET18_R, 179.99999999999162, 60.0000000000021)
            Line((4.066e-13, 5.499261314031734), (-0.12699999999964662, 5.499261314031687))
            Line((-0.12699999999964662, 5.499261314031687), (-0.12700000000005465, -5.457e-14))
            Line((-0.12700000000005465, -5.457e-14), (-5.076e-14, -0.1269999999999836))
            ThreePointArc((-5.076e-14, -0.1269999999999836), (1.5875000000000143, -0.12700000000015826), (3.111499999999835, -0.10998522628064958))
            Line((3.111499999999835, -0.10998522628064958), (3.1749999999998253, 4e-17))
        make_face()
    extrude(amount=63.8029343325191, mode=Mode.SUBTRACT)

    # Fillet19
    fillet19_edges = [part.edges().sort_by_distance(p)[0] for p in [
        (-798.0046429473542, 442.01152081511304, 707.5479836595266),
    ]]
    fillet(fillet19_edges, radius=FILLET19_R)

    # Fillet20
    # the kernel refuses this fillet: 6.35 mm, written as the material it takes off along each edge
    with BuildSketch(Plane(origin=(-769.7293137380176, 420.4353271465504, 683.6899062591938), x_dir=(-0.11144160447232392, 0.6677710026657372, -0.7359773480151613), z_dir=(0.0038076061723917327, 0.7408719776966206, 0.6716354776209593))) as fillet20_piece_1:
        with BuildLine():
            CenterArc((5.499261314031944, 6.350000000000002), FILLET20_R, 209.99999999999807, 60.000000000001535)
            Line((6.1001e-13, 3.1750000000001637), (-0.10998522627997129, 3.1115000000001984))
            ThreePointArc((-0.10998522627997129, 3.1115000000001984), (-0.1269999999998684, 1.587499999999964), (-0.12699999999996808, 3.003e-14))
            Line((-0.12699999999996808, 3.003e-14), (7.233e-14, -0.12700000000005462))
            Line((7.233e-14, -0.12700000000005462), (5.499261314031964, -0.1270000000000532))
            Line((5.499261314031964, -0.1270000000000532), (5.499261314031899, 2e-17))
        make_face()
    extrude(amount=63.80293433251974, mode=Mode.SUBTRACT)

    # Fillet21
    fillet21_edges = [part.edges().sort_by_distance(p)[0] for p in [
        (-772.7630452294634, 443.8414847282936, 705.3862767588042),
    ]]
    fillet(fillet21_edges, radius=FILLET21_R)

    # Sketch31 → Cut-Extrude12 (cut)
    with BuildSketch(Plane(origin=(-816.2774321378596, -59.17843476671879, 69.90653197462376), x_dir=(0.08496772843683141, 0.00499531120865976, 0.9963711818344676), z_dir=(-0.9937636896807374, -0.07204582335356424, 0.0851065708945801))):
        with BuildLine():
            Line((674.89672333572, 475.06621853047307), (642.8078588238949, 494.0354384472156))
            Line((642.807858823895, 494.0354384472155), (631.5959908804484, 481.7207876200674))
            Line((631.5959908804484, 481.7207876200674), (640.0621753209273, 450.88432237161936))
            ThreePointArc((640.0621753209274, 450.8843223716194), (653.5627042491733, 456.70516147569845), (666.8303845646924, 450.3715125855905))
            Line((666.8303845646924, 450.3715125855905), (674.0144117362669, 473.09085730973936))
            ThreePointArc((674.0144117362669, 473.09085730973936), (674.3993015391981, 474.10366959785017), (674.89672333572, 475.06621853047307))
        make_face()
        with BuildLine():
            Line((656.1572086631237, 508.697810753842), (644.945340719677, 496.3831599266939))
            Line((644.945340719677, 496.3831599266939), (676.9276979560174, 477.47690141298455))
            ThreePointArc((676.9276979560175, 477.47690141298443), (679.2112410996338, 478.9158383382181), (681.806739301328, 479.65644474418536))
            Line((681.806739301328, 479.6564447441853), (707.6795808792585, 483.1915499794374))
            Line((707.6795808792585, 483.1915499794374), (710.4861416611554, 499.1329215743282))
            Line((710.4861416611554, 499.1329215743282), (656.1572086631237, 508.697810753842))
        make_face()
    cut_extrude12 = extrude(amount=-CUT_EXTRUDE12_DEPTH, mode=Mode.SUBTRACT)

    # Mirror7: Cut-Extrude12 across plane
    add(cut_extrude12.mirror(Plane(origin=(-803.6566332789141, -58.26345281012812, 68.82567852426239), x_dir=(0.08488379068765235, 0.00615390022091489, 0.9963718540738523), z_dir=(0.9937636896807375, 0.07204582335356381, -0.08510657089457987))), mode=Mode.SUBTRACT)

    # Fillet22
    fillet22_edges = [part.edges().sort_by_distance(p)[0] for p in [
        (-789.1370396345999, 420.73051927759144, 744.5791420768076),
        (-793.2197196550782, 439.4276482053311, 712.7347253120122),
        (-793.1563076799398, 451.76614995770234, 723.920160538413),
        (-787.8494256367547, 442.4976264112924, 778.0408732089827),
        (-786.9367740043706, 426.58386105891134, 775.226046206104),
        (-788.0377184094101, 393.64546844047766, 734.487097923037),
        (-790.3491820896078, 394.0232236490786, 707.8166191749503),
        (-793.2952207798138, 424.7368779237731, 699.4168474441651),
        (-793.2318088046756, 437.07537967614434, 710.6022826705657),
        (-789.1355326904995, 418.3159857862957, 742.5527473430857),
        (-772.0989611750235, 421.96574491898843, 743.11998991882),
        (-769.8986955447944, 427.8190867003083, 773.7668940481163),
        (-770.8113471771785, 443.7328520526894, 776.581721050995),
        (-776.1182292203634, 453.0013755990992, 722.4610083804254),
        (-776.1816411955019, 440.66287384672796, 711.2755731540245),
        (-773.3111036300314, 395.2584492904755, 706.3574670169627),
        (-770.9996399498339, 394.8806940818746, 733.0279457650495),
        (-772.0974542309233, 419.5512114276926, 741.093595185098),
        (-776.1937303450991, 438.3106053175412, 709.1431305125781),
        (-776.2571423202376, 425.9721035651701, 697.9576952861775),
    ]]
    fillet(fillet22_edges, radius=FILLET22_R)


solid = part.part
